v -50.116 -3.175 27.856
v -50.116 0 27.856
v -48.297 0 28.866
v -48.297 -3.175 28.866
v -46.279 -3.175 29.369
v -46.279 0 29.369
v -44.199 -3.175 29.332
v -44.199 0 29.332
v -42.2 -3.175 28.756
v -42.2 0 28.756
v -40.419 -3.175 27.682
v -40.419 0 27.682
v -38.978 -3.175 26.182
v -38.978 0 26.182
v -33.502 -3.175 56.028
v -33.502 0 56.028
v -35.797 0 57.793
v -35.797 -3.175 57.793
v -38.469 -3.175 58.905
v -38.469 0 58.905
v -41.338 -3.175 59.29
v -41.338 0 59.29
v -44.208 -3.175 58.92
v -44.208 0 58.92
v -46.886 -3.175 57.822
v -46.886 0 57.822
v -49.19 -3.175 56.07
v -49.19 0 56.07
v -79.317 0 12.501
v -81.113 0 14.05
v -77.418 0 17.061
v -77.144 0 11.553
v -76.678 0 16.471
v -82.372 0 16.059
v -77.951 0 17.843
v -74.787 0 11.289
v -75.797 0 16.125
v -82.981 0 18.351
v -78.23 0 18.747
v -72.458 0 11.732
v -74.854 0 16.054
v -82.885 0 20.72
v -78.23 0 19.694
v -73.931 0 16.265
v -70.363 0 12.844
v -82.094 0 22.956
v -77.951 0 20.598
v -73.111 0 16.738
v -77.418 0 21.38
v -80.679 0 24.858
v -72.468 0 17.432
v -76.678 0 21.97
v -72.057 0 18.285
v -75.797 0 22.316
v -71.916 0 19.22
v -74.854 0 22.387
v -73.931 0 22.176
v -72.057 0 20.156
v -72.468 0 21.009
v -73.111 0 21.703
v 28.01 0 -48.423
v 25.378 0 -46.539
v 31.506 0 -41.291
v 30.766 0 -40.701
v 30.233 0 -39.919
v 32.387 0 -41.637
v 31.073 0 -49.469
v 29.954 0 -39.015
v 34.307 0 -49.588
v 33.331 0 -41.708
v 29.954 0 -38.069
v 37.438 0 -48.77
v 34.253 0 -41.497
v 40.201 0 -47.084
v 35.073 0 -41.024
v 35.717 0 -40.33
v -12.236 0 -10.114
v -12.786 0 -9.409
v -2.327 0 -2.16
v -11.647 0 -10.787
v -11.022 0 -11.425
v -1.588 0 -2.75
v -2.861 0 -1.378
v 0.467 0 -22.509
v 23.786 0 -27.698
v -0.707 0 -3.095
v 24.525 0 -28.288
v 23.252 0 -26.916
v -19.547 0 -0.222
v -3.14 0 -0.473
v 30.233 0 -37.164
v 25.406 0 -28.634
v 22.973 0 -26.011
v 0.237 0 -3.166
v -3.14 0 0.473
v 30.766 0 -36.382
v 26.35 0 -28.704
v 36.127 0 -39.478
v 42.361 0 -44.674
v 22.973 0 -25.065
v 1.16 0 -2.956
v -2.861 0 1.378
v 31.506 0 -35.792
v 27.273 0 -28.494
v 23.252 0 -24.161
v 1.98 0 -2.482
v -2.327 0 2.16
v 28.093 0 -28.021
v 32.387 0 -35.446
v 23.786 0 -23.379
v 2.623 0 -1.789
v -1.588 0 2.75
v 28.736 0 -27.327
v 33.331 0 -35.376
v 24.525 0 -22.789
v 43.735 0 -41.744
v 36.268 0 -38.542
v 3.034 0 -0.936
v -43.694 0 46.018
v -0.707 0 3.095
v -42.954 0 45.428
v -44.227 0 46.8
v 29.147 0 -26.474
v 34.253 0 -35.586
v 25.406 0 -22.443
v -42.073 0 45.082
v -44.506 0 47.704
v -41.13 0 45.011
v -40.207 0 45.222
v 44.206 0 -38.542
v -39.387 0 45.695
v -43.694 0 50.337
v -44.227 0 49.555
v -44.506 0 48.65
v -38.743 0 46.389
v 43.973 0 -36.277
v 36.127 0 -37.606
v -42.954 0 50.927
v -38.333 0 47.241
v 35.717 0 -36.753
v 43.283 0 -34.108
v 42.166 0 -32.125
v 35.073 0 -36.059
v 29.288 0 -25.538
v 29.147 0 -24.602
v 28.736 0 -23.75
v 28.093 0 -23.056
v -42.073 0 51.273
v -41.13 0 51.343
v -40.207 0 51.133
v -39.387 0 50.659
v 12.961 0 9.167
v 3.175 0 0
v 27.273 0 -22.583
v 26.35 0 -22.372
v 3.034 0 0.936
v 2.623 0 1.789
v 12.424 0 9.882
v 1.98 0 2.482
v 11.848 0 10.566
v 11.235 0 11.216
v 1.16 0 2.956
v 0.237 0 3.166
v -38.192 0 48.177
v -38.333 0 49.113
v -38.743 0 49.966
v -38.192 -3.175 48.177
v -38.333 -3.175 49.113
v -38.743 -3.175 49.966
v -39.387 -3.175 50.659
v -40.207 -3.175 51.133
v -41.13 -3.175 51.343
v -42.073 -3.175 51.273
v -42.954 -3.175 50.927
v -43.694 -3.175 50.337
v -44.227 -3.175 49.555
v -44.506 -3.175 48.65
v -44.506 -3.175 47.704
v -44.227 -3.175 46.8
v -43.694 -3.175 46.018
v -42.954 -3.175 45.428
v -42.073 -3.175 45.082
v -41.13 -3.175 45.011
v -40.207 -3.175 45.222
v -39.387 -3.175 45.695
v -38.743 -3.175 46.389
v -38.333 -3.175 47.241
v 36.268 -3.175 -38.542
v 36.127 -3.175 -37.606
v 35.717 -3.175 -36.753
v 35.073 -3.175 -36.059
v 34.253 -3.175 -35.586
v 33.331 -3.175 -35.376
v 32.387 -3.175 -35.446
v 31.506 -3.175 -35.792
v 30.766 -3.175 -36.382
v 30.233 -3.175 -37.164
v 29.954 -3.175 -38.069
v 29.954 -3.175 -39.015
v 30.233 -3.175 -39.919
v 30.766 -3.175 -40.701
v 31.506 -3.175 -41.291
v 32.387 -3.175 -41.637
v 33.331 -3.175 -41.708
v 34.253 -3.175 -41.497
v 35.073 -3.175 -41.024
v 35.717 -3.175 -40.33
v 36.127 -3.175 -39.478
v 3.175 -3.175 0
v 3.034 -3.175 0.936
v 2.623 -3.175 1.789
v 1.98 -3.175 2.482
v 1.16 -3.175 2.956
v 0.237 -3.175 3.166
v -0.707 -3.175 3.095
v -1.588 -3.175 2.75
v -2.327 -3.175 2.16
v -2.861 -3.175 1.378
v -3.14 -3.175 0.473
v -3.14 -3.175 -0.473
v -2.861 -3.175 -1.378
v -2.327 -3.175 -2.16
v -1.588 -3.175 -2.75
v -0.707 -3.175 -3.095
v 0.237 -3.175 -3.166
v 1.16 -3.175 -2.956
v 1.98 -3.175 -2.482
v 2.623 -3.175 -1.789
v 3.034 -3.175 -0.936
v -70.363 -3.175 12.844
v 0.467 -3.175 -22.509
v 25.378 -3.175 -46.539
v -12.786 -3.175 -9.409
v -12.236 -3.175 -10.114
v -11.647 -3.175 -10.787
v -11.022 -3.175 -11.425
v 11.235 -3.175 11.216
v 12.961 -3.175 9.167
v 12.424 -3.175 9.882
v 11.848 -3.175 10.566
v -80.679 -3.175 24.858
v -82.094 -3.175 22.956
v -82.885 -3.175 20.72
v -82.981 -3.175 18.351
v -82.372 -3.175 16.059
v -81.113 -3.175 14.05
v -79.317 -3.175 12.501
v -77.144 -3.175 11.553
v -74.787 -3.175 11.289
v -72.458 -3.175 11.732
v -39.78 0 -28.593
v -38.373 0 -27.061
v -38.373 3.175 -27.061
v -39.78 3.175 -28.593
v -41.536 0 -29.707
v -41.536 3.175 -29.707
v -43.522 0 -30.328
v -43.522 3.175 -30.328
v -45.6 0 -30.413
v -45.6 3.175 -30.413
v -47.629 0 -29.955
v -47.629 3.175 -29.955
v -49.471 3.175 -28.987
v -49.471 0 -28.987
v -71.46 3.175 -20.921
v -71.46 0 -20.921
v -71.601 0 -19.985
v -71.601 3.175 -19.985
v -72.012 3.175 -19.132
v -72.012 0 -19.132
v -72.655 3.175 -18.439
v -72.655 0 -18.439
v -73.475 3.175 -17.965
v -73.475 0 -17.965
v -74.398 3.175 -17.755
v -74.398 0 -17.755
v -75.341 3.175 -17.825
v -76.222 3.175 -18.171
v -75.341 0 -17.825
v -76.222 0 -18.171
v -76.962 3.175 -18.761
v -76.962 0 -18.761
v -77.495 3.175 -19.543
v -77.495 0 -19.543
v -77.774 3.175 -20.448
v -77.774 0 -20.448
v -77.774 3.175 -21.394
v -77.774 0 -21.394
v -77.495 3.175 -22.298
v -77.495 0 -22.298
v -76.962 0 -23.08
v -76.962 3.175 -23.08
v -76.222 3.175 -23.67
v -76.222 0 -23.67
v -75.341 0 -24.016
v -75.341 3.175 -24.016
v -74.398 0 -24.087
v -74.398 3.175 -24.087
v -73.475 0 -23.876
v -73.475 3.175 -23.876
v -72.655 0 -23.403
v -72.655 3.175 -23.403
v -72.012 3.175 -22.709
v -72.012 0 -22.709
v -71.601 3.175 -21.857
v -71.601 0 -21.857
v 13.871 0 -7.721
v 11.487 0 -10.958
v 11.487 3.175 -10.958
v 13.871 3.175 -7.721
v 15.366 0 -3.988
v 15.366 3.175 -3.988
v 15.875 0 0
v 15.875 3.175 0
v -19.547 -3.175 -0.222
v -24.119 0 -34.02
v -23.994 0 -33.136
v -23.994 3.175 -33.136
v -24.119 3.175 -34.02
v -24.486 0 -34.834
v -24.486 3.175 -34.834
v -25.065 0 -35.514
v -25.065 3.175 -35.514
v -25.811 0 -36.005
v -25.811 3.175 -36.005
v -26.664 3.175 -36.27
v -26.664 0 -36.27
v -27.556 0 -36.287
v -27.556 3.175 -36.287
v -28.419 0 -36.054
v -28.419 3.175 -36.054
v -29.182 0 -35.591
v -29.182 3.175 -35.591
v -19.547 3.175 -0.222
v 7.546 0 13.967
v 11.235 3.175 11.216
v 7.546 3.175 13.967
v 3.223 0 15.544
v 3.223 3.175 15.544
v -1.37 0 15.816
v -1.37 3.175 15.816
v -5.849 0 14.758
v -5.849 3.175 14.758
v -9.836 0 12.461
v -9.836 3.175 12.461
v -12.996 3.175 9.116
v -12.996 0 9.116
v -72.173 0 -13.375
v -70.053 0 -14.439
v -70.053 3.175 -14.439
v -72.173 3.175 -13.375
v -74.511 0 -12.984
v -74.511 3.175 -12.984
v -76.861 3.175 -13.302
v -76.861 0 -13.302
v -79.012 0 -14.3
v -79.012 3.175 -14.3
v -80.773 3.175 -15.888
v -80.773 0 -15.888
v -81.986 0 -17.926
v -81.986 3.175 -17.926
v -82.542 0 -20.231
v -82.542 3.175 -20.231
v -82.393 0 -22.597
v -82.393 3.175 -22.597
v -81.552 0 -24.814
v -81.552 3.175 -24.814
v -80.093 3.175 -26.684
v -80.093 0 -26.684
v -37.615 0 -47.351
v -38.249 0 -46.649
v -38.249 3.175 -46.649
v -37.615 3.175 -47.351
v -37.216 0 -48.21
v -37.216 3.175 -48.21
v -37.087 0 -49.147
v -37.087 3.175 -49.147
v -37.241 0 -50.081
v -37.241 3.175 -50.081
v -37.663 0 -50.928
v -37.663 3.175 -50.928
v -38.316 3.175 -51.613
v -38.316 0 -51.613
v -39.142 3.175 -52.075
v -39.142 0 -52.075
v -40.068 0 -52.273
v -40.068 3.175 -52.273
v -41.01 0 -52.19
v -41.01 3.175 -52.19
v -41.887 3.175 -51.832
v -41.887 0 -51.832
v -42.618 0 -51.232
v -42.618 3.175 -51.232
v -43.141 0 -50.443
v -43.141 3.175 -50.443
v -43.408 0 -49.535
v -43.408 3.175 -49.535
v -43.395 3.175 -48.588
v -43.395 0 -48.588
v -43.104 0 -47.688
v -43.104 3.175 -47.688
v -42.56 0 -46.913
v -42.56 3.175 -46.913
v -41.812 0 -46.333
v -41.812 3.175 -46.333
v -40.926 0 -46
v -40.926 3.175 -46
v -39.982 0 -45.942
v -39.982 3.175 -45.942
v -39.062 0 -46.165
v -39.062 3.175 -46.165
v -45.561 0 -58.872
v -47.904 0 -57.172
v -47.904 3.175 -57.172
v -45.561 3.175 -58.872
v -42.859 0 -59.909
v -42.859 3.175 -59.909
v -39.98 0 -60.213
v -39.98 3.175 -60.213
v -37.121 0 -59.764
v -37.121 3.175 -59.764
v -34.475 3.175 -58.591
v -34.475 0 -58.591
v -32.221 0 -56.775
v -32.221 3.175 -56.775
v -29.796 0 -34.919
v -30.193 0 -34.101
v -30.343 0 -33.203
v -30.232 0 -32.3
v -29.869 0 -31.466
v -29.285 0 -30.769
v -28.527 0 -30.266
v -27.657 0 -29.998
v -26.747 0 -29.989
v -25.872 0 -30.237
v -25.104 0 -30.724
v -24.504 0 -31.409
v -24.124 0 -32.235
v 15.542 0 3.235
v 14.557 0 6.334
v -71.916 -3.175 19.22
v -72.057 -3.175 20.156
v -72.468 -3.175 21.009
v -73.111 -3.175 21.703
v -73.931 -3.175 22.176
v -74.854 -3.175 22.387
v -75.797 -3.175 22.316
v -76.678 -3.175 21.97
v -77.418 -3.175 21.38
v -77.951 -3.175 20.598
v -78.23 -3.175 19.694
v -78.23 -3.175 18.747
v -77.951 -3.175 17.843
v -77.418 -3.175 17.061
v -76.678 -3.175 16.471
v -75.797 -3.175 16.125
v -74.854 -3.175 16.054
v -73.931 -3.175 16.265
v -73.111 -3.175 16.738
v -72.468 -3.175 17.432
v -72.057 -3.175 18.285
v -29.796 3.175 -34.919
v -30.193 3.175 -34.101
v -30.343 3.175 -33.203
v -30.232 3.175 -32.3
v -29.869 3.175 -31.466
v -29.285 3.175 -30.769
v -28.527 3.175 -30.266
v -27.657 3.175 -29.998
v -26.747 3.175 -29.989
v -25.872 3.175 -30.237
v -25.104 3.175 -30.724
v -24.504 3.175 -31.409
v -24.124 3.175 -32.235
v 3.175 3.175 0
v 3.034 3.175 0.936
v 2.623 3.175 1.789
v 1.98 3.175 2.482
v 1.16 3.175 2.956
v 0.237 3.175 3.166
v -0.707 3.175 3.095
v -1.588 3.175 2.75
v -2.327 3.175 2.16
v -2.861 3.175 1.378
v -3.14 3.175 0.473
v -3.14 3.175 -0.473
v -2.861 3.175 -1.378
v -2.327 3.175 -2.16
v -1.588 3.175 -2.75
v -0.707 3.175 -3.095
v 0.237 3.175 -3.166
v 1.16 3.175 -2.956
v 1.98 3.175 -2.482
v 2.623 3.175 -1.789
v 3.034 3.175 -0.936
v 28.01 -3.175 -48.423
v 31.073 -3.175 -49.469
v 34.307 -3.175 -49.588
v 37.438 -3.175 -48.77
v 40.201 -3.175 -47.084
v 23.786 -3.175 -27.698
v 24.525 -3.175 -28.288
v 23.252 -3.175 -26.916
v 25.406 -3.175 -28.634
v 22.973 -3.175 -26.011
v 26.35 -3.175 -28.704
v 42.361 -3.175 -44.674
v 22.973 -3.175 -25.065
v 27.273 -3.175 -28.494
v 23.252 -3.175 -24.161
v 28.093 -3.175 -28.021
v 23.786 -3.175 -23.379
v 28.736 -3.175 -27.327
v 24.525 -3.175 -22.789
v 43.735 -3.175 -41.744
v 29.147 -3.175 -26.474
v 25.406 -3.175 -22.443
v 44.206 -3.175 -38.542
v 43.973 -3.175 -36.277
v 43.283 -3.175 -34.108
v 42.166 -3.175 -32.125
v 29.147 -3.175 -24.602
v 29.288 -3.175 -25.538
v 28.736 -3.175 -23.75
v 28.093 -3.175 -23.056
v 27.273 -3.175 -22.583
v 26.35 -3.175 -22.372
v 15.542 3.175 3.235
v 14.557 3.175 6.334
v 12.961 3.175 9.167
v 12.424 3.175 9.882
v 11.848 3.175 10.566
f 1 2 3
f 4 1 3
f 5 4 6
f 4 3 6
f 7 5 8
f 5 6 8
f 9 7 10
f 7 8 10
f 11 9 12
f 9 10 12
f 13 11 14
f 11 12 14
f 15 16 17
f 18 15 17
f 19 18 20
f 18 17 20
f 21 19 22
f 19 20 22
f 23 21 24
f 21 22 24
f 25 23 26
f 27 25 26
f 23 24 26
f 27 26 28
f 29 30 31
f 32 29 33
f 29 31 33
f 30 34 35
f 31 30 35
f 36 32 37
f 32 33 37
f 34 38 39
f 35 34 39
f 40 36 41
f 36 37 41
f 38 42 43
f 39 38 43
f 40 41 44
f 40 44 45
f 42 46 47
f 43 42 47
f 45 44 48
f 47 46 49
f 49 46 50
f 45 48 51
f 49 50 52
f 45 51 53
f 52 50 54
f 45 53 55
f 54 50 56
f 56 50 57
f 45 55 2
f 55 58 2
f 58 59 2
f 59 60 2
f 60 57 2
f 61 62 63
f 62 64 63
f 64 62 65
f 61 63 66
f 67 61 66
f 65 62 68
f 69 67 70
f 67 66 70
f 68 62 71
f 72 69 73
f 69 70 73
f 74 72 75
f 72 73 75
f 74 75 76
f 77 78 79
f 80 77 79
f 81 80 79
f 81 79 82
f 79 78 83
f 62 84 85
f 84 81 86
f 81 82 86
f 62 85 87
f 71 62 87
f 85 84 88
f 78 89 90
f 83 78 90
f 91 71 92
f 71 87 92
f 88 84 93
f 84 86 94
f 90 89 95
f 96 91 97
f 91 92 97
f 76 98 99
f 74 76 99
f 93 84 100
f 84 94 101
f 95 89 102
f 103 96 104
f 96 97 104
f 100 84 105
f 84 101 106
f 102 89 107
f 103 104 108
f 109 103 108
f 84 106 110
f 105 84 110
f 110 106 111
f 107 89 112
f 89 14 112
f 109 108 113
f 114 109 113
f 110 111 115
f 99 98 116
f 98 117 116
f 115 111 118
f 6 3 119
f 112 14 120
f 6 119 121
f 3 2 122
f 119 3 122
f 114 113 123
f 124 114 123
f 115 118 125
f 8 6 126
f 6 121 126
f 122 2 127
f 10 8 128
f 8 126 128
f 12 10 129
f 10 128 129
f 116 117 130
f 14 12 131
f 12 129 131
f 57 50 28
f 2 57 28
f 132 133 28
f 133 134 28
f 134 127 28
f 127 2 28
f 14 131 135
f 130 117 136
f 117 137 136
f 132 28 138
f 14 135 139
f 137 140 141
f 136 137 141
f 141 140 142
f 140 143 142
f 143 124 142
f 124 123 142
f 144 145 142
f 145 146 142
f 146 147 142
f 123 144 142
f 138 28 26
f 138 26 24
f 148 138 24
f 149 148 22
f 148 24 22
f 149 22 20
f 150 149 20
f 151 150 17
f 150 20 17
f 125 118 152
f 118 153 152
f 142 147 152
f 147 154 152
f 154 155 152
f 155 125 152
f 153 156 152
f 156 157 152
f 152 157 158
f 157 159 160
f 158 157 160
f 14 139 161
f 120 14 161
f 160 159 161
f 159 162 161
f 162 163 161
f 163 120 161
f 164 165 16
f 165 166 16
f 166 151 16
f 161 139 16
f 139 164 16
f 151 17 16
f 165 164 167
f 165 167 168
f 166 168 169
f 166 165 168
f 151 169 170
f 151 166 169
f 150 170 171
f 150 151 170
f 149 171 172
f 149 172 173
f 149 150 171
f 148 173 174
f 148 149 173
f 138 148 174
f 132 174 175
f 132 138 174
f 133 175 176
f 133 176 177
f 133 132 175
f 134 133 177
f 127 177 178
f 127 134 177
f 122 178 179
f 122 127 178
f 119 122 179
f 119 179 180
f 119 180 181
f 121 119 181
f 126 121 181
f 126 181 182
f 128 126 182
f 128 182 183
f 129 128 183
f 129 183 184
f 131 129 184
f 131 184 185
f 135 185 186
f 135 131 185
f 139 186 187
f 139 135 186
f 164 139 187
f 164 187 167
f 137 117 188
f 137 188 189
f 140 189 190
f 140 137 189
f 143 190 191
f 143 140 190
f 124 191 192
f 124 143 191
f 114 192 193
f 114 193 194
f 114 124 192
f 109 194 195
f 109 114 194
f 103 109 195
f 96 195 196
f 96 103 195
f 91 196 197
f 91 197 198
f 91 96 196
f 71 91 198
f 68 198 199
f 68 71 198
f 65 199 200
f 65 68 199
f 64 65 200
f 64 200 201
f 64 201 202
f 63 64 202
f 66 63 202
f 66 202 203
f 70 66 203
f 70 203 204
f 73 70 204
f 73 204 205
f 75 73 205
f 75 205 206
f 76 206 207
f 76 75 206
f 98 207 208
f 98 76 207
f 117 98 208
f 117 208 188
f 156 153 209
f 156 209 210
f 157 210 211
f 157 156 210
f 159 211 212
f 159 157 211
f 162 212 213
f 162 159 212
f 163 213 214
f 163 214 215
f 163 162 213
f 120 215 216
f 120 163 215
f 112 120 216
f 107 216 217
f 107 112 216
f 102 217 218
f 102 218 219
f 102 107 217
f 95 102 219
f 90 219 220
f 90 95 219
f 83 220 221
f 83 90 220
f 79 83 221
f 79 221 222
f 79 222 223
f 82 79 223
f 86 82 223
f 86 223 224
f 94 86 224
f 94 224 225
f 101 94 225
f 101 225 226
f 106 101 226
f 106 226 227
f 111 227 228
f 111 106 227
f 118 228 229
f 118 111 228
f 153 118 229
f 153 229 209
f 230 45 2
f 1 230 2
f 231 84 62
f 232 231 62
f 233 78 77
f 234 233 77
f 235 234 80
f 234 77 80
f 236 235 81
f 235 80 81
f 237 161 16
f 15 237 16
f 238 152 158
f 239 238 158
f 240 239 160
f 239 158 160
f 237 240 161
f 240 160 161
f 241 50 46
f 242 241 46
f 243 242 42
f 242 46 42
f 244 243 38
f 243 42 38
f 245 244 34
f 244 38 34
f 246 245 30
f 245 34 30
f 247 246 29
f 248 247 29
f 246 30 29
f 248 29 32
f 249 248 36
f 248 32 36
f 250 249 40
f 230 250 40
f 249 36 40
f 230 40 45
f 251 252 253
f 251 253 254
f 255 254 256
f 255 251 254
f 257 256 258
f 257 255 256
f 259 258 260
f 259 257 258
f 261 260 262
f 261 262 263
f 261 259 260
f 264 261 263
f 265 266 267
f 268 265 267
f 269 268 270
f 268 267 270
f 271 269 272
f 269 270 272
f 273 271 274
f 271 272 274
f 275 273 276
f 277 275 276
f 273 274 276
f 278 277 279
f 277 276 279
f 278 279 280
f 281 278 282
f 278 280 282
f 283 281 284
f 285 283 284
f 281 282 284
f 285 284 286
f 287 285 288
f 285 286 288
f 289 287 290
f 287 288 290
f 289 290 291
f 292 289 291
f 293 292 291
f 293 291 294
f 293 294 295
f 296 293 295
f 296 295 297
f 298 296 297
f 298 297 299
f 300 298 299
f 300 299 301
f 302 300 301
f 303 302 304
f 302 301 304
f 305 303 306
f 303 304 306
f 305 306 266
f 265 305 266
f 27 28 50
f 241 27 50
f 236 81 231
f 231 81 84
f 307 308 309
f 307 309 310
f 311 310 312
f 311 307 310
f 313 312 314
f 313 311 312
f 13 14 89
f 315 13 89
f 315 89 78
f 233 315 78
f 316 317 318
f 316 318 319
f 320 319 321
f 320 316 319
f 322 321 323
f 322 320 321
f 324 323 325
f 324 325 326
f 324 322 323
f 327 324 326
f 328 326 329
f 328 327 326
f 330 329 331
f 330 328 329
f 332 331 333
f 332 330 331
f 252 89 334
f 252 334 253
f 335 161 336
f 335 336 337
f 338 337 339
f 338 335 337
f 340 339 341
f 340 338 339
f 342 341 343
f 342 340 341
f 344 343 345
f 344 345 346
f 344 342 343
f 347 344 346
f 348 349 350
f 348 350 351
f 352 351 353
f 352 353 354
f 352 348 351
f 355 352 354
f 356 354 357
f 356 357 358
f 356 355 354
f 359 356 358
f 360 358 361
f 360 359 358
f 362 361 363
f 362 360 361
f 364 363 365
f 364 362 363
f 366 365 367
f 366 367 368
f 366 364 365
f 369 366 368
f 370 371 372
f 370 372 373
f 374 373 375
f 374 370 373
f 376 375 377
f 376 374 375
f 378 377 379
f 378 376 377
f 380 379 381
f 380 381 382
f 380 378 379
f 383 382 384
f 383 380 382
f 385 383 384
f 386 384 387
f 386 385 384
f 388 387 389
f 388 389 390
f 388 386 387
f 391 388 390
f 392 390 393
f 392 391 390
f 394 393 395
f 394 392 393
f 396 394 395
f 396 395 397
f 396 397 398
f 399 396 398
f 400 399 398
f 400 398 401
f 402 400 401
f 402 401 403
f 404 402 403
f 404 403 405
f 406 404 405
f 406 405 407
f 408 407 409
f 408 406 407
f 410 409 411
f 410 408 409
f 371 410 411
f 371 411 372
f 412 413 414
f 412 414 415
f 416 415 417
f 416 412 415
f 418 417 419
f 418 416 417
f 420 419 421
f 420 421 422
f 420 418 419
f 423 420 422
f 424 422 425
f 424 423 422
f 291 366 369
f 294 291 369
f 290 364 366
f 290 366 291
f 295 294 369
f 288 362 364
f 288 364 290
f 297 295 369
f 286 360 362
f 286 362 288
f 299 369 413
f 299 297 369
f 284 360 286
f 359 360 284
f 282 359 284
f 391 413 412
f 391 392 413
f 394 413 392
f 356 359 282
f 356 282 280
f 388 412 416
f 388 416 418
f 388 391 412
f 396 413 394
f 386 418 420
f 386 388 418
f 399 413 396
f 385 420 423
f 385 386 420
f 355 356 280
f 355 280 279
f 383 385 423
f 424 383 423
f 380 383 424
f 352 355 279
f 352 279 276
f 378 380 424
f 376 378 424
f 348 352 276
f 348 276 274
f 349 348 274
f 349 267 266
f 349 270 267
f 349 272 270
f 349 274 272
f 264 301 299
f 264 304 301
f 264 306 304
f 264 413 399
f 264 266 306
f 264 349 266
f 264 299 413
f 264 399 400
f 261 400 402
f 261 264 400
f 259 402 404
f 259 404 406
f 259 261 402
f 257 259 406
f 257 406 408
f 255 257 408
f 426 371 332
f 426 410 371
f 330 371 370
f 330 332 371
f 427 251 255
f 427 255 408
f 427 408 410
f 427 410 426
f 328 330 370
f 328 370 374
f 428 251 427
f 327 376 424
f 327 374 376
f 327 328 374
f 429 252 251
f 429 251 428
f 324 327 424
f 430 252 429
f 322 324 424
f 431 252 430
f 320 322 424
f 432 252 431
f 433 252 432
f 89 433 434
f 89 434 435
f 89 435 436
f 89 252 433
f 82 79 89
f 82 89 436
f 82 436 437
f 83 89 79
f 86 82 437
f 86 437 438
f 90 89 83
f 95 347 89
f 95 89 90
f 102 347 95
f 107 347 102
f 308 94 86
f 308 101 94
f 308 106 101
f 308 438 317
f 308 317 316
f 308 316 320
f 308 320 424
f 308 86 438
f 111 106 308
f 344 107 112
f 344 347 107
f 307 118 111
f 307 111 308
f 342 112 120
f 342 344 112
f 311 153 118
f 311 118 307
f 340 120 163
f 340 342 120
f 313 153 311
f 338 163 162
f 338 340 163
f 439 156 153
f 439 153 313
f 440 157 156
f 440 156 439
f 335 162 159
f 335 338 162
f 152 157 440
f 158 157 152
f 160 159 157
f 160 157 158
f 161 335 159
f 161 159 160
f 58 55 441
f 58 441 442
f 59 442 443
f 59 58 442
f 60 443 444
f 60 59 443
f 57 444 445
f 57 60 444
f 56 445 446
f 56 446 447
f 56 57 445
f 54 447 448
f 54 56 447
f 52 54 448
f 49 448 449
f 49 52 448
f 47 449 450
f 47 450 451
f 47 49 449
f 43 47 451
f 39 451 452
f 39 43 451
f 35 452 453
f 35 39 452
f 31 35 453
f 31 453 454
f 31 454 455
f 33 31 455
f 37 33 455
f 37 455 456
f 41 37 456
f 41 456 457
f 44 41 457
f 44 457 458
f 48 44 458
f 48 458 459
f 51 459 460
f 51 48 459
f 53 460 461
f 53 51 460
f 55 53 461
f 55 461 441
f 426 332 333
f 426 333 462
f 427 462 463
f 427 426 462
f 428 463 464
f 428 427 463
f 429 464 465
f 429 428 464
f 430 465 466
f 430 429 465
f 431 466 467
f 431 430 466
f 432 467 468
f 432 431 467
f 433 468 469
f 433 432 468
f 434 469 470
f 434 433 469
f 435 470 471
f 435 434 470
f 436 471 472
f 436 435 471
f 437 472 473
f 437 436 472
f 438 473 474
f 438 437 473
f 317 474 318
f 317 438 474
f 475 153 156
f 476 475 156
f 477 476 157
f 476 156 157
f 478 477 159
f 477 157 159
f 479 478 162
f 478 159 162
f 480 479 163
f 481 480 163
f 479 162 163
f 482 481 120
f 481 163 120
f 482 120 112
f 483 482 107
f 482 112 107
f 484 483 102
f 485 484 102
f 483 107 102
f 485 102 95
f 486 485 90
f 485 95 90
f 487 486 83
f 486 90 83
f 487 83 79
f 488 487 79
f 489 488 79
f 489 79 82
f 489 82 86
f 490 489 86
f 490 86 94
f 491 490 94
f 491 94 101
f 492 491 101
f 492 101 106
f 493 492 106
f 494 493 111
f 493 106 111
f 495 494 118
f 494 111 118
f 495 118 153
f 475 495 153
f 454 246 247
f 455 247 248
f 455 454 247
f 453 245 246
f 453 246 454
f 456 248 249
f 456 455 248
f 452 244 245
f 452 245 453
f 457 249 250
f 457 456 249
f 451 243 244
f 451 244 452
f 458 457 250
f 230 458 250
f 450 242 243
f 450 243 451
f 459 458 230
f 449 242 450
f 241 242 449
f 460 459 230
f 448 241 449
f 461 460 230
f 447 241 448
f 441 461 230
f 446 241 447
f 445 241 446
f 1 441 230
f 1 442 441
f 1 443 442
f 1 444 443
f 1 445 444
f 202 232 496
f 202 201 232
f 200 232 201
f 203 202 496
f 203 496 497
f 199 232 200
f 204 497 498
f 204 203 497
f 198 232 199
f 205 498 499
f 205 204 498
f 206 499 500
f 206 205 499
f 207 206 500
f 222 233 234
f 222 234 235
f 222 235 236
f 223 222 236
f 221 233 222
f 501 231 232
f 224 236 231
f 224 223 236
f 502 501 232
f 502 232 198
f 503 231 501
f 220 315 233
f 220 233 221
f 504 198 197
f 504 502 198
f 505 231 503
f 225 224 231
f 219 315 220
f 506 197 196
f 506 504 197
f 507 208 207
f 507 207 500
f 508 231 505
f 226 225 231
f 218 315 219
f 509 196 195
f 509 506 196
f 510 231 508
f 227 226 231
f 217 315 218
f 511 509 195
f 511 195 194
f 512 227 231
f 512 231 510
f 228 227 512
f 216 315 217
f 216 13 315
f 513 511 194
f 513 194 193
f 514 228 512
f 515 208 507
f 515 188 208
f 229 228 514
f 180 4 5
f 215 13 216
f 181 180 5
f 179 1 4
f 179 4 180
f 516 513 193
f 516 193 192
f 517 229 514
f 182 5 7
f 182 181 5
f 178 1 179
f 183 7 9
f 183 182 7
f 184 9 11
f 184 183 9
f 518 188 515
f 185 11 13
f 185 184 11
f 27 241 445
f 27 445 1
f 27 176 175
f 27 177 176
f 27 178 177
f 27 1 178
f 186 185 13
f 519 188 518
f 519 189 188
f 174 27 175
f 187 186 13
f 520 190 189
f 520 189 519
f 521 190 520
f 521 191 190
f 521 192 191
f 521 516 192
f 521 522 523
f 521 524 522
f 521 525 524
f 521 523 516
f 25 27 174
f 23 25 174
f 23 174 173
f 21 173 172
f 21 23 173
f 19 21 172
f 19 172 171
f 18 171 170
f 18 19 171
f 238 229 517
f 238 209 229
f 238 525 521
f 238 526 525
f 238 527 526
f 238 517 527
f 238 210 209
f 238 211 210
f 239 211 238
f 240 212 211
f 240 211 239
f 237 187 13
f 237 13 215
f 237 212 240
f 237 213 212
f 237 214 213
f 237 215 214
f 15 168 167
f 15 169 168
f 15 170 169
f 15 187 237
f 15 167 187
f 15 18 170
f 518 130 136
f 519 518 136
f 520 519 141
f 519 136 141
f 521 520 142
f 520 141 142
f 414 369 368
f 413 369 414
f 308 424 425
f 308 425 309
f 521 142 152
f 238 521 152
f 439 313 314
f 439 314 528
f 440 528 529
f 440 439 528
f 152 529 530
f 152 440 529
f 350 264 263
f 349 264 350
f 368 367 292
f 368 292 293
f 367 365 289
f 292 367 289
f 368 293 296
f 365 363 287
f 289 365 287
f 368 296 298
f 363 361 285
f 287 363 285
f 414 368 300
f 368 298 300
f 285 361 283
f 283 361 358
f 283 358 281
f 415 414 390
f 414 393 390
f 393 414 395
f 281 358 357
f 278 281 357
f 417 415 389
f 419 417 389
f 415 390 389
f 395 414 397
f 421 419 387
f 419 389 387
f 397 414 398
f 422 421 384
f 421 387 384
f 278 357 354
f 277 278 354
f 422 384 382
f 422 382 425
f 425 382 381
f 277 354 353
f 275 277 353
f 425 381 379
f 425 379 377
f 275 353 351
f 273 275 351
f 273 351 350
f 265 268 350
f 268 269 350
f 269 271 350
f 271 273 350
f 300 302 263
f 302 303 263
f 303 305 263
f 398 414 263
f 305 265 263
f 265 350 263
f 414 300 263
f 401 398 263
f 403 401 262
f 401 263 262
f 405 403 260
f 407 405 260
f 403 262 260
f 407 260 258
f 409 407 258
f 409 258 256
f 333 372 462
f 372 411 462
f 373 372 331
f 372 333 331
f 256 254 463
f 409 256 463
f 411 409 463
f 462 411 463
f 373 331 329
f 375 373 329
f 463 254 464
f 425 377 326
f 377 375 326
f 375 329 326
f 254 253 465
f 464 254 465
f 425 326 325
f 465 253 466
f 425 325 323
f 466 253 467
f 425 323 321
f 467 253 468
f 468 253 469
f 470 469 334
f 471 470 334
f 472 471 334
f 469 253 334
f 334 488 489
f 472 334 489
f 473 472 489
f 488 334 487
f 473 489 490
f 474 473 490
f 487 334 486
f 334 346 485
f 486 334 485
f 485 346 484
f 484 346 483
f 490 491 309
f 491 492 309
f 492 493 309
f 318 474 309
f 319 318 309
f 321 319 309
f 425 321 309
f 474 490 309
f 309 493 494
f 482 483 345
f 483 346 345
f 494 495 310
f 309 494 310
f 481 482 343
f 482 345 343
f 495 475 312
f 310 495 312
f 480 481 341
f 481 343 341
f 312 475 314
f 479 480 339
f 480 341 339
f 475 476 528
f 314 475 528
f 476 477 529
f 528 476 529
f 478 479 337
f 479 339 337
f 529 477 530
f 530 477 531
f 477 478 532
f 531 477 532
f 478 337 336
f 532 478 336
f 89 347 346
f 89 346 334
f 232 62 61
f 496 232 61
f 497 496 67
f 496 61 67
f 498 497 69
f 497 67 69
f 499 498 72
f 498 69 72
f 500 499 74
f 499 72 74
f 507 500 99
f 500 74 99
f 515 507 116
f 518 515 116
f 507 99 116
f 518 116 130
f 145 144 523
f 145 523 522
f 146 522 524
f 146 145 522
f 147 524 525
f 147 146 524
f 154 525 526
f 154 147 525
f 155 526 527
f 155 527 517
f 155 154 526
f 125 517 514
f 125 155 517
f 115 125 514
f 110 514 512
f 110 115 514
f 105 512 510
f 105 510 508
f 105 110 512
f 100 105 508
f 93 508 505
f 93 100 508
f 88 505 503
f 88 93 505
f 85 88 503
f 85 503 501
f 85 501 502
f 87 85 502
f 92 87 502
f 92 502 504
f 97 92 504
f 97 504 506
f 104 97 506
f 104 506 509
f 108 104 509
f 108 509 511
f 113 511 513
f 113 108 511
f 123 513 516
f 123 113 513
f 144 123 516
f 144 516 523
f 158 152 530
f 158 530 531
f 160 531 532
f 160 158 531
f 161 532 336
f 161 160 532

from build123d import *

# Parameters (mm, degrees)
F0_R     = 3.175
F0_R_2   = 3.9751
F1_DEPTH = 3.175
F2_DEPTH = 3.175


with BuildPart() as f1:
    # F0 (on Front) → F1 (new body)
    with BuildSketch(Plane.XZ):
        with BuildLine():
            ThreePointArc((-12.9963928803, 9.116435548), (-1.3703255214, 15.8157463613), (11.2347363475, 11.2158960499))
            Line((11.2347363475, 11.2158960499), (-33.502491082, 56.0282724172))
            ThreePointArc((-33.502491082, 56.0282724172), (-31.0984117721, 52.4254066435), (-30.2543065252, 48.1771451822))
            ThreePointArc((-30.2543065252, 48.1771451822), (-45.6420561484, 37.9199576091), (-49.189721042, 56.06952535))
            Line((-49.189721042, 56.06952535), (-80.6786042362, 24.8577950201))
            ThreePointArc((-80.6786042362, 24.8577950201), (-72.0370584219, 26.5469431668), (-67.1533081527, 19.2203806146))
            ThreePointArc((-67.1533081527, 19.2203806146), (-68.0010846925, 15.6511051269), (-70.3633182333, 12.8442732353))
            Line((-70.3633182333, 12.8442732353), (-50.1161145203, 27.8563245948))
            ThreePointArc((-50.1161145203, 27.8563245948), (-44.1993680748, 29.3319034343), (-38.9778360276, 26.1821693991))
            Line((-38.9778360276, 26.1821693991), (-19.5469214699, -0.2219997072))
            Line((-19.5469214699, -0.2219997072), (-12.9963928803, 9.116435548))
        make_face()
        with BuildLine():
            ThreePointArc((-30.2543065252, 48.1771451822), (-31.0984117721, 52.4254066435), (-33.502491082, 56.0282724172))
            ThreePointArc((-33.502491082, 56.0282724172), (-41.3375839262, 59.2896067587), (-49.189721042, 56.06952535))
            ThreePointArc((-49.189721042, 56.06952535), (-45.6420561484, 37.9199576091), (-30.2543065252, 48.1771451822))
        make_face()
        with Locations((-41.3668065252, 48.1771451822)):
            Circle(F0_R, mode=Mode.SUBTRACT)
        with BuildLine():
            ThreePointArc((12.960775018, 9.1670025599), (15.1289115341, 4.809538522), (15.875, 0))
            ThreePointArc((15.875, 0), (14.7371115992, -5.9019629541), (11.4865695481, -10.9578439949))
            Line((11.4865695481, -10.9578439949), (0.4674695088, -22.5086252451))
            Line((0.4674695088, -22.5086252451), (25.3782510467, -46.539430514))
            ThreePointArc((25.3782510467, -46.539430514), (25.8542540782, -30.1107157389), (42.1659877328, -32.1248143539))
            Line((42.1659877328, -32.1248143539), (12.960775018, 9.1670025599))
        make_face()
        with Locations((26.1129773372, -25.5382585473)):
            Circle(F0_R, mode=Mode.SUBTRACT)
        with BuildLine():
            ThreePointArc((-12.7859915921, -9.4092531056), (-15.8739762597, -0.1802850688), (-12.9963928803, 9.116435548))
            Line((-12.9963928803, 9.116435548), (-19.5469214699, -0.2219997072))
            Line((-19.5469214699, -0.2219997072), (-12.7859915921, -9.4092531056))
        make_face()
        with BuildLine():
            Line((0.4674695088, -22.5086252451), (11.4865695481, -10.9578439949))
            ThreePointArc((11.4865695481, -10.9578439949), (0.3296282392, -15.8715774334), (-11.0217059621, -11.4253062403))
            Line((-11.0217059621, -11.4253062403), (0.4674695088, -22.5086252451))
        make_face()
        with BuildLine():
            ThreePointArc((44.2059452202, -38.5417161458), (43.683683294, -35.1750391804), (42.1659877328, -32.1248143539))
            ThreePointArc((42.1659877328, -32.1248143539), (25.8542540782, -30.1107157389), (25.3782510467, -46.539430514))
            ThreePointArc((25.3782510467, -46.539430514), (37.4381293857, -48.7696864112), (44.2059452202, -38.5417161458))
        make_face()
        with Locations((33.0934452202, -38.5417161458)):
            Circle(F0_R, mode=Mode.SUBTRACT)
        with BuildLine():
            ThreePointArc((-67.1533081527, 19.2203806146), (-72.0370584219, 26.5469431668), (-80.6786042362, 24.8577950201))
            ThreePointArc((-80.6786042362, 24.8577950201), (-81.1129513005, 14.0495297989), (-70.3633182333, 12.8442732353))
            ThreePointArc((-70.3633182333, 12.8442732353), (-68.0010846925, 15.6511051269), (-67.1533081527, 19.2203806146))
        make_face()
        with Locations((-75.0908081527, 19.2203806146)):
            Circle(F0_R, mode=Mode.SUBTRACT)
        with BuildLine():
            ThreePointArc((11.4865695481, -10.9578439949), (14.7371115992, -5.9019629541), (15.875, 0))
            ThreePointArc((15.875, 0), (15.1289115341, 4.809538522), (12.960775018, 9.1670025599))
            ThreePointArc((12.960775018, 9.1670025599), (12.1410536484, 10.2279245846), (11.2347363475, 11.2158960499))
            ThreePointArc((11.2347363475, 11.2158960499), (-1.3703255214, 15.8157463613), (-12.9963928803, 9.116435548))
            ThreePointArc((-12.9963928803, 9.116435548), (-15.8739762597, -0.1802850688), (-12.7859915921, -9.4092531056))
            ThreePointArc((-12.7859915921, -9.4092531056), (-11.9464527484, -10.4545632013), (-11.0217059621, -11.4253062403))
            ThreePointArc((-11.0217059621, -11.4253062403), (0.3296282392, -15.8715774334), (11.4865695481, -10.9578439949))
        make_face()
        Circle(F0_R_2, mode=Mode.SUBTRACT)
        Circle(F0_R_2)
        Circle(F0_R, mode=Mode.SUBTRACT)
    extrude(amount=F1_DEPTH)


with BuildPart() as f2:
    # F0 (on Front) → F2 (new body)
    with BuildSketch(Plane.XZ):
        with BuildLine():
            ThreePointArc((-70.0534543926, -14.4390247389), (-80.7729413552, -15.8881119418), (-80.0932331707, -26.6837245343))
            ThreePointArc((-80.0932331707, -26.6837245343), (-71.4981559981, -28.212266432), (-66.697413199, -20.9208563824))
            ThreePointArc((-66.697413199, -20.9208563824), (-67.5861815569, -17.2712963422), (-70.0534543926, -14.4390247389))
        make_face()
        with Locations((-74.634913199, -20.9208563824)):
            Circle(F0_R, mode=Mode.SUBTRACT)
        with BuildLine():
            ThreePointArc((-47.9036034847, -57.1722406622), (-39.9803585162, -60.2131567631), (-32.2213568408, -56.7747160459))
            ThreePointArc((-32.2213568408, -56.7747160459), (-29.945977405, -53.2355993173), (-29.1494555244, -49.1042252495))
            ThreePointArc((-29.1494555244, -49.1042252495), (-30.2174401582, -44.3507667919), (-33.2161133077, -40.5109858308))
            ThreePointArc((-33.2161133077, -40.5109858308), (-48.5979077352, -41.7557861642), (-47.9036034847, -57.1722406622))
        make_face()
        with BuildLine():
            ThreePointArc((-37.0869555244, -49.1042252495), (-43.1318170576, -50.4623562373), (-38.2488577482, -46.649013987))
            ThreePointArc((-38.2488577482, -46.649013987), (-37.3920939912, -47.7460942616), (-37.0869555244, -49.1042252495))
        make_face(mode=Mode.SUBTRACT)
        with BuildLine():
            ThreePointArc((11.4865695481, -10.9578439949), (14.7371115992, -5.9019629541), (15.875, 0))
            ThreePointArc((15.875, 0), (15.1289115341, 4.809538522), (12.960775018, 9.1670025599))
            ThreePointArc((12.960775018, 9.1670025599), (12.1410536484, 10.2279245846), (11.2347363475, 11.2158960499))
            ThreePointArc((11.2347363475, 11.2158960499), (-1.3703255214, 15.8157463613), (-12.9963928803, 9.116435548))
            ThreePointArc((-12.9963928803, 9.116435548), (-15.8739762597, -0.1802850688), (-12.7859915921, -9.4092531056))
            ThreePointArc((-12.7859915921, -9.4092531056), (-11.9464527484, -10.4545632013), (-11.0217059621, -11.4253062403))
            ThreePointArc((-11.0217059621, -11.4253062403), (0.3296282392, -15.8715774334), (11.4865695481, -10.9578439949))
        make_face()
        Circle(F0_R_2, mode=Mode.SUBTRACT)
        with BuildLine():
            Line((0.4674695088, -22.5086252451), (-11.0217059621, -11.4253062403))
            ThreePointArc((-11.0217059621, -11.4253062403), (-11.9464527484, -10.4545632013), (-12.7859915921, -9.4092531056))
            Line((-12.7859915921, -9.4092531056), (-19.5469214699, -0.2219997072))
            Line((-19.5469214699, -0.2219997072), (-38.3731426606, -27.0606655164))
            ThreePointArc((-38.3731426606, -27.0606655164), (-43.5217923092, -30.3281765276), (-49.4705253556, -28.9873571681))
            Line((-49.4705253556, -28.9873571681), (-70.0534543926, -14.4390247389))
            ThreePointArc((-70.0534543926, -14.4390247389), (-67.5861815569, -17.2712963422), (-66.697413199, -20.9208563824))
            ThreePointArc((-66.697413199, -20.9208563824), (-71.4981559981, -28.212266432), (-80.0932331707, -26.6837245343))
            Line((-80.0932331707, -26.6837245343), (-47.9036034847, -57.1722406622))
            ThreePointArc((-47.9036034847, -57.1722406622), (-48.5979077352, -41.7557861642), (-33.2161133077, -40.5109858308))
            ThreePointArc((-33.2161133077, -40.5109858308), (-30.2174401582, -44.3507667919), (-29.1494555244, -49.1042252495))
            ThreePointArc((-29.1494555244, -49.1042252495), (-29.945977405, -53.2355993173), (-32.2213568408, -56.7747160459))
            Line((-32.2213568408, -56.7747160459), (0.4674695088, -22.5086252451))
        make_face()
        with BuildLine():
            ThreePointArc((-23.9937675879, -33.1355311983), (-25.8106366, -36.0053927315), (-29.1818653641, -35.5907424608))
            ThreePointArc((-29.1818653641, -35.5907424608), (-28.5268985758, -30.2656696651), (-23.9937675879, -33.1355311983))
        make_face(mode=Mode.SUBTRACT)
        with BuildLine():
            Line((0.4674695088, -22.5086252451), (11.4865695481, -10.9578439949))
            ThreePointArc((11.4865695481, -10.9578439949), (0.3296282392, -15.8715774334), (-11.0217059621, -11.4253062403))
            Line((-11.0217059621, -11.4253062403), (0.4674695088, -22.5086252451))
        make_face()
        with BuildLine():
            ThreePointArc((-12.7859915921, -9.4092531056), (-15.8739762597, -0.1802850688), (-12.9963928803, 9.116435548))
            Line((-12.9963928803, 9.116435548), (-19.5469214699, -0.2219997072))
            Line((-19.5469214699, -0.2219997072), (-12.7859915921, -9.4092531056))
        make_face()
        Circle(F0_R_2)
        Circle(F0_R, mode=Mode.SUBTRACT)
    extrude(amount=-F2_DEPTH)


solid = Compound([f1.part, f2.part])
